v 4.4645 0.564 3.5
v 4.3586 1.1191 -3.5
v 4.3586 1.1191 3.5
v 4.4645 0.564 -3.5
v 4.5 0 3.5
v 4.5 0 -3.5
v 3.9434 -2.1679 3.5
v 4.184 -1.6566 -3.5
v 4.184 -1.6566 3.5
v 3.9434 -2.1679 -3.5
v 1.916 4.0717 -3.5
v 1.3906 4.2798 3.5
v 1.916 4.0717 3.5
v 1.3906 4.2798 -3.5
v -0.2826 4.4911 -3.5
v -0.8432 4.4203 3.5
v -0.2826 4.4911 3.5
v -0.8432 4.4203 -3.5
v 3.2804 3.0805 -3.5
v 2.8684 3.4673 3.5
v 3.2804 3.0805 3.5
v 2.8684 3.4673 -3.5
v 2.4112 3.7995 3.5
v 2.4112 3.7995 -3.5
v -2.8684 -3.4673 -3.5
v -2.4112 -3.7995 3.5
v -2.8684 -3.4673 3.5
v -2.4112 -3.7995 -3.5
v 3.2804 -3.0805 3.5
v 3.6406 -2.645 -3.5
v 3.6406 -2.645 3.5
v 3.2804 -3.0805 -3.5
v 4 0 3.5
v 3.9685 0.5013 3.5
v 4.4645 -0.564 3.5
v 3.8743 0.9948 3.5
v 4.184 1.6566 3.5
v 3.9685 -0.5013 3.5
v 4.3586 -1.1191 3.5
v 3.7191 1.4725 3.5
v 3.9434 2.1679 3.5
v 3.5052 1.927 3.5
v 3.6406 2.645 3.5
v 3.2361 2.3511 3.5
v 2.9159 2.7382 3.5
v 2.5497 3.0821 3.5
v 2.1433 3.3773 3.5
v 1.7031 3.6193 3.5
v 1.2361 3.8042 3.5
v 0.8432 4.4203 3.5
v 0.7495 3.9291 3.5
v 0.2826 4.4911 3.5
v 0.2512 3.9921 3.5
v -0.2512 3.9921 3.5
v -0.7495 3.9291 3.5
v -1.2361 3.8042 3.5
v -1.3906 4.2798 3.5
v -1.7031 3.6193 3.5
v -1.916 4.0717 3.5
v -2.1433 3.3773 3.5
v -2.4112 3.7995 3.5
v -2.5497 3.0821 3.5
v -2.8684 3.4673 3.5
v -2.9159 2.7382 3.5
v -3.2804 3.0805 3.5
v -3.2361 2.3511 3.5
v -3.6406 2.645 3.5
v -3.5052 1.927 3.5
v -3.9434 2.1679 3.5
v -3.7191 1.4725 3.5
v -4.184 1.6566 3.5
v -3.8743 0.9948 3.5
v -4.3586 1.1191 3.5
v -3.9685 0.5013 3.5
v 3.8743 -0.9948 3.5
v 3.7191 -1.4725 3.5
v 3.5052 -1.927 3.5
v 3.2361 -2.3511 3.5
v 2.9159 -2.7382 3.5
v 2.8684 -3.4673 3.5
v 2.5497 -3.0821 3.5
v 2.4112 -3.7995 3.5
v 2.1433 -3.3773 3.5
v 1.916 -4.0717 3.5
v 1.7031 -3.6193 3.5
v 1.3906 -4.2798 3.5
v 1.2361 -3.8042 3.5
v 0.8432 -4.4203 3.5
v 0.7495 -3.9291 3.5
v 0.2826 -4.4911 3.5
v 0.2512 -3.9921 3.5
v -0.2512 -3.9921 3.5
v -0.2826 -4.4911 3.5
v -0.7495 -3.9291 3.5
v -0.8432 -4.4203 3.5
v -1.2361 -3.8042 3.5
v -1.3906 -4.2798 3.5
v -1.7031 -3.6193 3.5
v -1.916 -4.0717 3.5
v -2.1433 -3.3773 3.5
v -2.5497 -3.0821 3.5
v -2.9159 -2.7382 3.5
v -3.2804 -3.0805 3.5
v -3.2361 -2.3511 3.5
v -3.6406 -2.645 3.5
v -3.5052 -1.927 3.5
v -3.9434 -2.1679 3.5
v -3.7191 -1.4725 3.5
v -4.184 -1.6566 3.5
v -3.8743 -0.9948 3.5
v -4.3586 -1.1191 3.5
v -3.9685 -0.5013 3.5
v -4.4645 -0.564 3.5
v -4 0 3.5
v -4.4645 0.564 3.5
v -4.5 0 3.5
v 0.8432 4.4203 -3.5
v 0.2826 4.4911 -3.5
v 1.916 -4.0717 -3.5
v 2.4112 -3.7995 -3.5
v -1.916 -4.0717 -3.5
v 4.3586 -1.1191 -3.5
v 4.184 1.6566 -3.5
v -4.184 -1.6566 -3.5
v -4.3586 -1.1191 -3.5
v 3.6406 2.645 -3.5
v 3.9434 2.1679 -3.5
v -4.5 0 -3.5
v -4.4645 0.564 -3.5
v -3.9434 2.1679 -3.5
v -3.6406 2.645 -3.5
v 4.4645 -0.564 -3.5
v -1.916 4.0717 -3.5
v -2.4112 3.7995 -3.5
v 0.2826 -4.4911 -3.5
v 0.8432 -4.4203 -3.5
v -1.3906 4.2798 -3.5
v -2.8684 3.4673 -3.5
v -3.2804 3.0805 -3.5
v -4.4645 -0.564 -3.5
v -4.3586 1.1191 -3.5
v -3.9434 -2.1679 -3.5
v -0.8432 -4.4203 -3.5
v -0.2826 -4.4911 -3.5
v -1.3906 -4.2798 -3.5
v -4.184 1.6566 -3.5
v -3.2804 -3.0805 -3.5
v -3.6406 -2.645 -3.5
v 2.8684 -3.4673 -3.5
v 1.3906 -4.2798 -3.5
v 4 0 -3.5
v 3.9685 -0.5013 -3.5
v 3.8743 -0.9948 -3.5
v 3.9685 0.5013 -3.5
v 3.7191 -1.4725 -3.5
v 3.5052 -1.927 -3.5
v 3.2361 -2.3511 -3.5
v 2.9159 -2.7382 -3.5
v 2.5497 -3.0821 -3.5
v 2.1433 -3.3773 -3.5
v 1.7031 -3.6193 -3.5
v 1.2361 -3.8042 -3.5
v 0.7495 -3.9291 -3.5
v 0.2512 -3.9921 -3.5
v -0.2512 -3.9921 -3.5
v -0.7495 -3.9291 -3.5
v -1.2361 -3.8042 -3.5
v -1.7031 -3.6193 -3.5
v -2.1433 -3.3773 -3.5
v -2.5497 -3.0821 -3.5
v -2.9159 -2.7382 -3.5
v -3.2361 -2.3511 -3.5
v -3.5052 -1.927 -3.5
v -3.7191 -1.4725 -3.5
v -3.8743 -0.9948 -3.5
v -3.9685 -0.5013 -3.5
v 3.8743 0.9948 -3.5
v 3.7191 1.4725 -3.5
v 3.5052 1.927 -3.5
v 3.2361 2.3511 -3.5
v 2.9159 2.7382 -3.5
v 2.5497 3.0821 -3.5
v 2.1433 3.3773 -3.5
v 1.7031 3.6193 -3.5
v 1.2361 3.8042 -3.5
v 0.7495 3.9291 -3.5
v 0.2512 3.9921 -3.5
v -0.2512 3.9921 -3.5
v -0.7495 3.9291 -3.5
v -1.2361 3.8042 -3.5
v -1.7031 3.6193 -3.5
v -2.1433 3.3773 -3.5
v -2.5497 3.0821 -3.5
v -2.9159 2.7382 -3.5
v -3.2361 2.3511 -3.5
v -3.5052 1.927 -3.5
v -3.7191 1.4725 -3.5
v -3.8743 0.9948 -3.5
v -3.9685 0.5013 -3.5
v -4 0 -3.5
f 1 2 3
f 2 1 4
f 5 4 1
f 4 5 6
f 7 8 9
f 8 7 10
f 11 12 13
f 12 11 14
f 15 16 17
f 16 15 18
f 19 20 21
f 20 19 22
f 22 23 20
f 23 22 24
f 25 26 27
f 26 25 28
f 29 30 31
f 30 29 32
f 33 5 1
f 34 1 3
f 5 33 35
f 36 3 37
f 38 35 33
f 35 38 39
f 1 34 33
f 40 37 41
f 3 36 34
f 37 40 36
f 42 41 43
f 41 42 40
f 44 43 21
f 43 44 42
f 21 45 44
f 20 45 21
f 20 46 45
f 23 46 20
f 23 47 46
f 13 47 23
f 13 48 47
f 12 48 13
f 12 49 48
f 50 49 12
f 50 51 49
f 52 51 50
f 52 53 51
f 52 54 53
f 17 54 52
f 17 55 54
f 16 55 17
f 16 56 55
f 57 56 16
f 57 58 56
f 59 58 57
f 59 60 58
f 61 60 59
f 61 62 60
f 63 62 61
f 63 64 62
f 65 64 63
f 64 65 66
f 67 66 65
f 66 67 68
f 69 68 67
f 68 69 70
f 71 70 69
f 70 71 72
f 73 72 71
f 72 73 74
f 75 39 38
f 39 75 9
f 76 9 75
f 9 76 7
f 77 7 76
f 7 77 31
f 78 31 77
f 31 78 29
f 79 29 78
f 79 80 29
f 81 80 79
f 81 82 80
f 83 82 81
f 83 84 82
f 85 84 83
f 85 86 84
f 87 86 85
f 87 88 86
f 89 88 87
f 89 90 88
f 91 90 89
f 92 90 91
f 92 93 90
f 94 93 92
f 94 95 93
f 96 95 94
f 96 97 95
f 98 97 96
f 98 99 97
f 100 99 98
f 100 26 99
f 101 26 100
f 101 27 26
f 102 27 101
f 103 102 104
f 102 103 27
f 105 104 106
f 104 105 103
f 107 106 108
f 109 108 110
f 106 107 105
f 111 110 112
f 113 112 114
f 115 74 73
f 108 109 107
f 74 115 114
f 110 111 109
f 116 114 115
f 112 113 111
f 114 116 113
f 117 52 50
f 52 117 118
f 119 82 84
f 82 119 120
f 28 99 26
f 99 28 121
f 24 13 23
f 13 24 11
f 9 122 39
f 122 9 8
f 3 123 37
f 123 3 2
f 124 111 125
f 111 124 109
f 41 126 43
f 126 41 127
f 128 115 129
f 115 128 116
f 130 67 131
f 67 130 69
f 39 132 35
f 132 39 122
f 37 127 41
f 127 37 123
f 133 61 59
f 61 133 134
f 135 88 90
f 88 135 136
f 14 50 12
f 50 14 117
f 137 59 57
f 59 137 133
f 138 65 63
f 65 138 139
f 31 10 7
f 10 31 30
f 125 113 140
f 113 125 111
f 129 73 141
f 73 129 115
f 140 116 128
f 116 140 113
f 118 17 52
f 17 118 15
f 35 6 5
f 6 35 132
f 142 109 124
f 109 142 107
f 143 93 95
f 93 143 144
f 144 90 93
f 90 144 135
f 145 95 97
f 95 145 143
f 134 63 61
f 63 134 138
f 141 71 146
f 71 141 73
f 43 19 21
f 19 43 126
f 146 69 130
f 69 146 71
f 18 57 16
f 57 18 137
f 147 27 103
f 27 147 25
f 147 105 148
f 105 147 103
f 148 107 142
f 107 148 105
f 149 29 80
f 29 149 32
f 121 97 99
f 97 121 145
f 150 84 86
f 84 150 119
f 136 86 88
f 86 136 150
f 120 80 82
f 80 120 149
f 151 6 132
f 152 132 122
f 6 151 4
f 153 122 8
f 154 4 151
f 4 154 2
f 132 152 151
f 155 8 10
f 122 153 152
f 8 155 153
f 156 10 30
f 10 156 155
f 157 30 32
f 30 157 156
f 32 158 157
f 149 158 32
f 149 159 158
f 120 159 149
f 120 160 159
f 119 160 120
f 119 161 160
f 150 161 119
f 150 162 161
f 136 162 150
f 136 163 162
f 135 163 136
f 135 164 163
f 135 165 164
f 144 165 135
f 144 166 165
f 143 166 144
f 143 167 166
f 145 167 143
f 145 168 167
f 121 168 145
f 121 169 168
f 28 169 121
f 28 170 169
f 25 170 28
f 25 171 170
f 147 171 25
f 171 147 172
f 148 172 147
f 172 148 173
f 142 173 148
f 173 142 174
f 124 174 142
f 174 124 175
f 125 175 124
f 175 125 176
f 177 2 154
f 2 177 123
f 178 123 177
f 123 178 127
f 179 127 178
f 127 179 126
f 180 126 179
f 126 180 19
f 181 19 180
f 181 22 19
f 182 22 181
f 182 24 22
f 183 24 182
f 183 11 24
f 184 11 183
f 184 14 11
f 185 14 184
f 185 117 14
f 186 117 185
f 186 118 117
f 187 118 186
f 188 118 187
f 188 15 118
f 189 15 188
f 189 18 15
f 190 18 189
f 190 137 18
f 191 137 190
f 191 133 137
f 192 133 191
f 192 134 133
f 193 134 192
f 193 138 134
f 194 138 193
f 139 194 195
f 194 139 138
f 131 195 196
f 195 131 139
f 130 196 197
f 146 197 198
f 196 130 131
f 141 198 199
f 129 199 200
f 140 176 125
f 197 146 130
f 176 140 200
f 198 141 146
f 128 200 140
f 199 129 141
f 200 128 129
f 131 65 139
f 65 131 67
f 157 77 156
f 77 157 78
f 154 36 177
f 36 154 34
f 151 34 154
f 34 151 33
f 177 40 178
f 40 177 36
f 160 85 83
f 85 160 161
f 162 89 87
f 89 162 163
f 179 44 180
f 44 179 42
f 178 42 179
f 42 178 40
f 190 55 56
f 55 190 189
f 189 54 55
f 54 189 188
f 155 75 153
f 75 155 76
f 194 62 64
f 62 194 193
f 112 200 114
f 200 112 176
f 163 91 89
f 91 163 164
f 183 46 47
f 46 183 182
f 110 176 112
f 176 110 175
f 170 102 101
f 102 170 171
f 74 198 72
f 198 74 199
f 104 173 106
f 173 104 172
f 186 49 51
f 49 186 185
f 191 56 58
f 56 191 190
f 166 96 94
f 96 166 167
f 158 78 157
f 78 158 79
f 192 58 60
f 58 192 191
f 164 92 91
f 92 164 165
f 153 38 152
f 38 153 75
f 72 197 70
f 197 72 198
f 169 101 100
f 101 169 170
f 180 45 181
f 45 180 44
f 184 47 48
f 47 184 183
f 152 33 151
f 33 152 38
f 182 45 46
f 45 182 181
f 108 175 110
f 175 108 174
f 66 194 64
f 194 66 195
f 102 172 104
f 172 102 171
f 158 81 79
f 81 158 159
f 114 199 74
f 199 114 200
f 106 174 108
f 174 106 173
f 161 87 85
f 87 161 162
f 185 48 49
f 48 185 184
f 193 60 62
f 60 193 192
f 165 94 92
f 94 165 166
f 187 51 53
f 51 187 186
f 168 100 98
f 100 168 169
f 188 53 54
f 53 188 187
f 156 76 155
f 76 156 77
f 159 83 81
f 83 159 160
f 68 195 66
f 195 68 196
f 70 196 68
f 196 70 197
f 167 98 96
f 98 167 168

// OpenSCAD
$fn = 50;


difference() {
	union() {
		translate(v = [0, 0, -3.5000000000]) {
			cylinder(h = 7, r = 4.5000000000);
		}
	}
	union() {
		translate(v = [0, 0, -100.0000000000]) {
			cylinder(h = 200, r = 4.0000000000);
		}
	}
}
